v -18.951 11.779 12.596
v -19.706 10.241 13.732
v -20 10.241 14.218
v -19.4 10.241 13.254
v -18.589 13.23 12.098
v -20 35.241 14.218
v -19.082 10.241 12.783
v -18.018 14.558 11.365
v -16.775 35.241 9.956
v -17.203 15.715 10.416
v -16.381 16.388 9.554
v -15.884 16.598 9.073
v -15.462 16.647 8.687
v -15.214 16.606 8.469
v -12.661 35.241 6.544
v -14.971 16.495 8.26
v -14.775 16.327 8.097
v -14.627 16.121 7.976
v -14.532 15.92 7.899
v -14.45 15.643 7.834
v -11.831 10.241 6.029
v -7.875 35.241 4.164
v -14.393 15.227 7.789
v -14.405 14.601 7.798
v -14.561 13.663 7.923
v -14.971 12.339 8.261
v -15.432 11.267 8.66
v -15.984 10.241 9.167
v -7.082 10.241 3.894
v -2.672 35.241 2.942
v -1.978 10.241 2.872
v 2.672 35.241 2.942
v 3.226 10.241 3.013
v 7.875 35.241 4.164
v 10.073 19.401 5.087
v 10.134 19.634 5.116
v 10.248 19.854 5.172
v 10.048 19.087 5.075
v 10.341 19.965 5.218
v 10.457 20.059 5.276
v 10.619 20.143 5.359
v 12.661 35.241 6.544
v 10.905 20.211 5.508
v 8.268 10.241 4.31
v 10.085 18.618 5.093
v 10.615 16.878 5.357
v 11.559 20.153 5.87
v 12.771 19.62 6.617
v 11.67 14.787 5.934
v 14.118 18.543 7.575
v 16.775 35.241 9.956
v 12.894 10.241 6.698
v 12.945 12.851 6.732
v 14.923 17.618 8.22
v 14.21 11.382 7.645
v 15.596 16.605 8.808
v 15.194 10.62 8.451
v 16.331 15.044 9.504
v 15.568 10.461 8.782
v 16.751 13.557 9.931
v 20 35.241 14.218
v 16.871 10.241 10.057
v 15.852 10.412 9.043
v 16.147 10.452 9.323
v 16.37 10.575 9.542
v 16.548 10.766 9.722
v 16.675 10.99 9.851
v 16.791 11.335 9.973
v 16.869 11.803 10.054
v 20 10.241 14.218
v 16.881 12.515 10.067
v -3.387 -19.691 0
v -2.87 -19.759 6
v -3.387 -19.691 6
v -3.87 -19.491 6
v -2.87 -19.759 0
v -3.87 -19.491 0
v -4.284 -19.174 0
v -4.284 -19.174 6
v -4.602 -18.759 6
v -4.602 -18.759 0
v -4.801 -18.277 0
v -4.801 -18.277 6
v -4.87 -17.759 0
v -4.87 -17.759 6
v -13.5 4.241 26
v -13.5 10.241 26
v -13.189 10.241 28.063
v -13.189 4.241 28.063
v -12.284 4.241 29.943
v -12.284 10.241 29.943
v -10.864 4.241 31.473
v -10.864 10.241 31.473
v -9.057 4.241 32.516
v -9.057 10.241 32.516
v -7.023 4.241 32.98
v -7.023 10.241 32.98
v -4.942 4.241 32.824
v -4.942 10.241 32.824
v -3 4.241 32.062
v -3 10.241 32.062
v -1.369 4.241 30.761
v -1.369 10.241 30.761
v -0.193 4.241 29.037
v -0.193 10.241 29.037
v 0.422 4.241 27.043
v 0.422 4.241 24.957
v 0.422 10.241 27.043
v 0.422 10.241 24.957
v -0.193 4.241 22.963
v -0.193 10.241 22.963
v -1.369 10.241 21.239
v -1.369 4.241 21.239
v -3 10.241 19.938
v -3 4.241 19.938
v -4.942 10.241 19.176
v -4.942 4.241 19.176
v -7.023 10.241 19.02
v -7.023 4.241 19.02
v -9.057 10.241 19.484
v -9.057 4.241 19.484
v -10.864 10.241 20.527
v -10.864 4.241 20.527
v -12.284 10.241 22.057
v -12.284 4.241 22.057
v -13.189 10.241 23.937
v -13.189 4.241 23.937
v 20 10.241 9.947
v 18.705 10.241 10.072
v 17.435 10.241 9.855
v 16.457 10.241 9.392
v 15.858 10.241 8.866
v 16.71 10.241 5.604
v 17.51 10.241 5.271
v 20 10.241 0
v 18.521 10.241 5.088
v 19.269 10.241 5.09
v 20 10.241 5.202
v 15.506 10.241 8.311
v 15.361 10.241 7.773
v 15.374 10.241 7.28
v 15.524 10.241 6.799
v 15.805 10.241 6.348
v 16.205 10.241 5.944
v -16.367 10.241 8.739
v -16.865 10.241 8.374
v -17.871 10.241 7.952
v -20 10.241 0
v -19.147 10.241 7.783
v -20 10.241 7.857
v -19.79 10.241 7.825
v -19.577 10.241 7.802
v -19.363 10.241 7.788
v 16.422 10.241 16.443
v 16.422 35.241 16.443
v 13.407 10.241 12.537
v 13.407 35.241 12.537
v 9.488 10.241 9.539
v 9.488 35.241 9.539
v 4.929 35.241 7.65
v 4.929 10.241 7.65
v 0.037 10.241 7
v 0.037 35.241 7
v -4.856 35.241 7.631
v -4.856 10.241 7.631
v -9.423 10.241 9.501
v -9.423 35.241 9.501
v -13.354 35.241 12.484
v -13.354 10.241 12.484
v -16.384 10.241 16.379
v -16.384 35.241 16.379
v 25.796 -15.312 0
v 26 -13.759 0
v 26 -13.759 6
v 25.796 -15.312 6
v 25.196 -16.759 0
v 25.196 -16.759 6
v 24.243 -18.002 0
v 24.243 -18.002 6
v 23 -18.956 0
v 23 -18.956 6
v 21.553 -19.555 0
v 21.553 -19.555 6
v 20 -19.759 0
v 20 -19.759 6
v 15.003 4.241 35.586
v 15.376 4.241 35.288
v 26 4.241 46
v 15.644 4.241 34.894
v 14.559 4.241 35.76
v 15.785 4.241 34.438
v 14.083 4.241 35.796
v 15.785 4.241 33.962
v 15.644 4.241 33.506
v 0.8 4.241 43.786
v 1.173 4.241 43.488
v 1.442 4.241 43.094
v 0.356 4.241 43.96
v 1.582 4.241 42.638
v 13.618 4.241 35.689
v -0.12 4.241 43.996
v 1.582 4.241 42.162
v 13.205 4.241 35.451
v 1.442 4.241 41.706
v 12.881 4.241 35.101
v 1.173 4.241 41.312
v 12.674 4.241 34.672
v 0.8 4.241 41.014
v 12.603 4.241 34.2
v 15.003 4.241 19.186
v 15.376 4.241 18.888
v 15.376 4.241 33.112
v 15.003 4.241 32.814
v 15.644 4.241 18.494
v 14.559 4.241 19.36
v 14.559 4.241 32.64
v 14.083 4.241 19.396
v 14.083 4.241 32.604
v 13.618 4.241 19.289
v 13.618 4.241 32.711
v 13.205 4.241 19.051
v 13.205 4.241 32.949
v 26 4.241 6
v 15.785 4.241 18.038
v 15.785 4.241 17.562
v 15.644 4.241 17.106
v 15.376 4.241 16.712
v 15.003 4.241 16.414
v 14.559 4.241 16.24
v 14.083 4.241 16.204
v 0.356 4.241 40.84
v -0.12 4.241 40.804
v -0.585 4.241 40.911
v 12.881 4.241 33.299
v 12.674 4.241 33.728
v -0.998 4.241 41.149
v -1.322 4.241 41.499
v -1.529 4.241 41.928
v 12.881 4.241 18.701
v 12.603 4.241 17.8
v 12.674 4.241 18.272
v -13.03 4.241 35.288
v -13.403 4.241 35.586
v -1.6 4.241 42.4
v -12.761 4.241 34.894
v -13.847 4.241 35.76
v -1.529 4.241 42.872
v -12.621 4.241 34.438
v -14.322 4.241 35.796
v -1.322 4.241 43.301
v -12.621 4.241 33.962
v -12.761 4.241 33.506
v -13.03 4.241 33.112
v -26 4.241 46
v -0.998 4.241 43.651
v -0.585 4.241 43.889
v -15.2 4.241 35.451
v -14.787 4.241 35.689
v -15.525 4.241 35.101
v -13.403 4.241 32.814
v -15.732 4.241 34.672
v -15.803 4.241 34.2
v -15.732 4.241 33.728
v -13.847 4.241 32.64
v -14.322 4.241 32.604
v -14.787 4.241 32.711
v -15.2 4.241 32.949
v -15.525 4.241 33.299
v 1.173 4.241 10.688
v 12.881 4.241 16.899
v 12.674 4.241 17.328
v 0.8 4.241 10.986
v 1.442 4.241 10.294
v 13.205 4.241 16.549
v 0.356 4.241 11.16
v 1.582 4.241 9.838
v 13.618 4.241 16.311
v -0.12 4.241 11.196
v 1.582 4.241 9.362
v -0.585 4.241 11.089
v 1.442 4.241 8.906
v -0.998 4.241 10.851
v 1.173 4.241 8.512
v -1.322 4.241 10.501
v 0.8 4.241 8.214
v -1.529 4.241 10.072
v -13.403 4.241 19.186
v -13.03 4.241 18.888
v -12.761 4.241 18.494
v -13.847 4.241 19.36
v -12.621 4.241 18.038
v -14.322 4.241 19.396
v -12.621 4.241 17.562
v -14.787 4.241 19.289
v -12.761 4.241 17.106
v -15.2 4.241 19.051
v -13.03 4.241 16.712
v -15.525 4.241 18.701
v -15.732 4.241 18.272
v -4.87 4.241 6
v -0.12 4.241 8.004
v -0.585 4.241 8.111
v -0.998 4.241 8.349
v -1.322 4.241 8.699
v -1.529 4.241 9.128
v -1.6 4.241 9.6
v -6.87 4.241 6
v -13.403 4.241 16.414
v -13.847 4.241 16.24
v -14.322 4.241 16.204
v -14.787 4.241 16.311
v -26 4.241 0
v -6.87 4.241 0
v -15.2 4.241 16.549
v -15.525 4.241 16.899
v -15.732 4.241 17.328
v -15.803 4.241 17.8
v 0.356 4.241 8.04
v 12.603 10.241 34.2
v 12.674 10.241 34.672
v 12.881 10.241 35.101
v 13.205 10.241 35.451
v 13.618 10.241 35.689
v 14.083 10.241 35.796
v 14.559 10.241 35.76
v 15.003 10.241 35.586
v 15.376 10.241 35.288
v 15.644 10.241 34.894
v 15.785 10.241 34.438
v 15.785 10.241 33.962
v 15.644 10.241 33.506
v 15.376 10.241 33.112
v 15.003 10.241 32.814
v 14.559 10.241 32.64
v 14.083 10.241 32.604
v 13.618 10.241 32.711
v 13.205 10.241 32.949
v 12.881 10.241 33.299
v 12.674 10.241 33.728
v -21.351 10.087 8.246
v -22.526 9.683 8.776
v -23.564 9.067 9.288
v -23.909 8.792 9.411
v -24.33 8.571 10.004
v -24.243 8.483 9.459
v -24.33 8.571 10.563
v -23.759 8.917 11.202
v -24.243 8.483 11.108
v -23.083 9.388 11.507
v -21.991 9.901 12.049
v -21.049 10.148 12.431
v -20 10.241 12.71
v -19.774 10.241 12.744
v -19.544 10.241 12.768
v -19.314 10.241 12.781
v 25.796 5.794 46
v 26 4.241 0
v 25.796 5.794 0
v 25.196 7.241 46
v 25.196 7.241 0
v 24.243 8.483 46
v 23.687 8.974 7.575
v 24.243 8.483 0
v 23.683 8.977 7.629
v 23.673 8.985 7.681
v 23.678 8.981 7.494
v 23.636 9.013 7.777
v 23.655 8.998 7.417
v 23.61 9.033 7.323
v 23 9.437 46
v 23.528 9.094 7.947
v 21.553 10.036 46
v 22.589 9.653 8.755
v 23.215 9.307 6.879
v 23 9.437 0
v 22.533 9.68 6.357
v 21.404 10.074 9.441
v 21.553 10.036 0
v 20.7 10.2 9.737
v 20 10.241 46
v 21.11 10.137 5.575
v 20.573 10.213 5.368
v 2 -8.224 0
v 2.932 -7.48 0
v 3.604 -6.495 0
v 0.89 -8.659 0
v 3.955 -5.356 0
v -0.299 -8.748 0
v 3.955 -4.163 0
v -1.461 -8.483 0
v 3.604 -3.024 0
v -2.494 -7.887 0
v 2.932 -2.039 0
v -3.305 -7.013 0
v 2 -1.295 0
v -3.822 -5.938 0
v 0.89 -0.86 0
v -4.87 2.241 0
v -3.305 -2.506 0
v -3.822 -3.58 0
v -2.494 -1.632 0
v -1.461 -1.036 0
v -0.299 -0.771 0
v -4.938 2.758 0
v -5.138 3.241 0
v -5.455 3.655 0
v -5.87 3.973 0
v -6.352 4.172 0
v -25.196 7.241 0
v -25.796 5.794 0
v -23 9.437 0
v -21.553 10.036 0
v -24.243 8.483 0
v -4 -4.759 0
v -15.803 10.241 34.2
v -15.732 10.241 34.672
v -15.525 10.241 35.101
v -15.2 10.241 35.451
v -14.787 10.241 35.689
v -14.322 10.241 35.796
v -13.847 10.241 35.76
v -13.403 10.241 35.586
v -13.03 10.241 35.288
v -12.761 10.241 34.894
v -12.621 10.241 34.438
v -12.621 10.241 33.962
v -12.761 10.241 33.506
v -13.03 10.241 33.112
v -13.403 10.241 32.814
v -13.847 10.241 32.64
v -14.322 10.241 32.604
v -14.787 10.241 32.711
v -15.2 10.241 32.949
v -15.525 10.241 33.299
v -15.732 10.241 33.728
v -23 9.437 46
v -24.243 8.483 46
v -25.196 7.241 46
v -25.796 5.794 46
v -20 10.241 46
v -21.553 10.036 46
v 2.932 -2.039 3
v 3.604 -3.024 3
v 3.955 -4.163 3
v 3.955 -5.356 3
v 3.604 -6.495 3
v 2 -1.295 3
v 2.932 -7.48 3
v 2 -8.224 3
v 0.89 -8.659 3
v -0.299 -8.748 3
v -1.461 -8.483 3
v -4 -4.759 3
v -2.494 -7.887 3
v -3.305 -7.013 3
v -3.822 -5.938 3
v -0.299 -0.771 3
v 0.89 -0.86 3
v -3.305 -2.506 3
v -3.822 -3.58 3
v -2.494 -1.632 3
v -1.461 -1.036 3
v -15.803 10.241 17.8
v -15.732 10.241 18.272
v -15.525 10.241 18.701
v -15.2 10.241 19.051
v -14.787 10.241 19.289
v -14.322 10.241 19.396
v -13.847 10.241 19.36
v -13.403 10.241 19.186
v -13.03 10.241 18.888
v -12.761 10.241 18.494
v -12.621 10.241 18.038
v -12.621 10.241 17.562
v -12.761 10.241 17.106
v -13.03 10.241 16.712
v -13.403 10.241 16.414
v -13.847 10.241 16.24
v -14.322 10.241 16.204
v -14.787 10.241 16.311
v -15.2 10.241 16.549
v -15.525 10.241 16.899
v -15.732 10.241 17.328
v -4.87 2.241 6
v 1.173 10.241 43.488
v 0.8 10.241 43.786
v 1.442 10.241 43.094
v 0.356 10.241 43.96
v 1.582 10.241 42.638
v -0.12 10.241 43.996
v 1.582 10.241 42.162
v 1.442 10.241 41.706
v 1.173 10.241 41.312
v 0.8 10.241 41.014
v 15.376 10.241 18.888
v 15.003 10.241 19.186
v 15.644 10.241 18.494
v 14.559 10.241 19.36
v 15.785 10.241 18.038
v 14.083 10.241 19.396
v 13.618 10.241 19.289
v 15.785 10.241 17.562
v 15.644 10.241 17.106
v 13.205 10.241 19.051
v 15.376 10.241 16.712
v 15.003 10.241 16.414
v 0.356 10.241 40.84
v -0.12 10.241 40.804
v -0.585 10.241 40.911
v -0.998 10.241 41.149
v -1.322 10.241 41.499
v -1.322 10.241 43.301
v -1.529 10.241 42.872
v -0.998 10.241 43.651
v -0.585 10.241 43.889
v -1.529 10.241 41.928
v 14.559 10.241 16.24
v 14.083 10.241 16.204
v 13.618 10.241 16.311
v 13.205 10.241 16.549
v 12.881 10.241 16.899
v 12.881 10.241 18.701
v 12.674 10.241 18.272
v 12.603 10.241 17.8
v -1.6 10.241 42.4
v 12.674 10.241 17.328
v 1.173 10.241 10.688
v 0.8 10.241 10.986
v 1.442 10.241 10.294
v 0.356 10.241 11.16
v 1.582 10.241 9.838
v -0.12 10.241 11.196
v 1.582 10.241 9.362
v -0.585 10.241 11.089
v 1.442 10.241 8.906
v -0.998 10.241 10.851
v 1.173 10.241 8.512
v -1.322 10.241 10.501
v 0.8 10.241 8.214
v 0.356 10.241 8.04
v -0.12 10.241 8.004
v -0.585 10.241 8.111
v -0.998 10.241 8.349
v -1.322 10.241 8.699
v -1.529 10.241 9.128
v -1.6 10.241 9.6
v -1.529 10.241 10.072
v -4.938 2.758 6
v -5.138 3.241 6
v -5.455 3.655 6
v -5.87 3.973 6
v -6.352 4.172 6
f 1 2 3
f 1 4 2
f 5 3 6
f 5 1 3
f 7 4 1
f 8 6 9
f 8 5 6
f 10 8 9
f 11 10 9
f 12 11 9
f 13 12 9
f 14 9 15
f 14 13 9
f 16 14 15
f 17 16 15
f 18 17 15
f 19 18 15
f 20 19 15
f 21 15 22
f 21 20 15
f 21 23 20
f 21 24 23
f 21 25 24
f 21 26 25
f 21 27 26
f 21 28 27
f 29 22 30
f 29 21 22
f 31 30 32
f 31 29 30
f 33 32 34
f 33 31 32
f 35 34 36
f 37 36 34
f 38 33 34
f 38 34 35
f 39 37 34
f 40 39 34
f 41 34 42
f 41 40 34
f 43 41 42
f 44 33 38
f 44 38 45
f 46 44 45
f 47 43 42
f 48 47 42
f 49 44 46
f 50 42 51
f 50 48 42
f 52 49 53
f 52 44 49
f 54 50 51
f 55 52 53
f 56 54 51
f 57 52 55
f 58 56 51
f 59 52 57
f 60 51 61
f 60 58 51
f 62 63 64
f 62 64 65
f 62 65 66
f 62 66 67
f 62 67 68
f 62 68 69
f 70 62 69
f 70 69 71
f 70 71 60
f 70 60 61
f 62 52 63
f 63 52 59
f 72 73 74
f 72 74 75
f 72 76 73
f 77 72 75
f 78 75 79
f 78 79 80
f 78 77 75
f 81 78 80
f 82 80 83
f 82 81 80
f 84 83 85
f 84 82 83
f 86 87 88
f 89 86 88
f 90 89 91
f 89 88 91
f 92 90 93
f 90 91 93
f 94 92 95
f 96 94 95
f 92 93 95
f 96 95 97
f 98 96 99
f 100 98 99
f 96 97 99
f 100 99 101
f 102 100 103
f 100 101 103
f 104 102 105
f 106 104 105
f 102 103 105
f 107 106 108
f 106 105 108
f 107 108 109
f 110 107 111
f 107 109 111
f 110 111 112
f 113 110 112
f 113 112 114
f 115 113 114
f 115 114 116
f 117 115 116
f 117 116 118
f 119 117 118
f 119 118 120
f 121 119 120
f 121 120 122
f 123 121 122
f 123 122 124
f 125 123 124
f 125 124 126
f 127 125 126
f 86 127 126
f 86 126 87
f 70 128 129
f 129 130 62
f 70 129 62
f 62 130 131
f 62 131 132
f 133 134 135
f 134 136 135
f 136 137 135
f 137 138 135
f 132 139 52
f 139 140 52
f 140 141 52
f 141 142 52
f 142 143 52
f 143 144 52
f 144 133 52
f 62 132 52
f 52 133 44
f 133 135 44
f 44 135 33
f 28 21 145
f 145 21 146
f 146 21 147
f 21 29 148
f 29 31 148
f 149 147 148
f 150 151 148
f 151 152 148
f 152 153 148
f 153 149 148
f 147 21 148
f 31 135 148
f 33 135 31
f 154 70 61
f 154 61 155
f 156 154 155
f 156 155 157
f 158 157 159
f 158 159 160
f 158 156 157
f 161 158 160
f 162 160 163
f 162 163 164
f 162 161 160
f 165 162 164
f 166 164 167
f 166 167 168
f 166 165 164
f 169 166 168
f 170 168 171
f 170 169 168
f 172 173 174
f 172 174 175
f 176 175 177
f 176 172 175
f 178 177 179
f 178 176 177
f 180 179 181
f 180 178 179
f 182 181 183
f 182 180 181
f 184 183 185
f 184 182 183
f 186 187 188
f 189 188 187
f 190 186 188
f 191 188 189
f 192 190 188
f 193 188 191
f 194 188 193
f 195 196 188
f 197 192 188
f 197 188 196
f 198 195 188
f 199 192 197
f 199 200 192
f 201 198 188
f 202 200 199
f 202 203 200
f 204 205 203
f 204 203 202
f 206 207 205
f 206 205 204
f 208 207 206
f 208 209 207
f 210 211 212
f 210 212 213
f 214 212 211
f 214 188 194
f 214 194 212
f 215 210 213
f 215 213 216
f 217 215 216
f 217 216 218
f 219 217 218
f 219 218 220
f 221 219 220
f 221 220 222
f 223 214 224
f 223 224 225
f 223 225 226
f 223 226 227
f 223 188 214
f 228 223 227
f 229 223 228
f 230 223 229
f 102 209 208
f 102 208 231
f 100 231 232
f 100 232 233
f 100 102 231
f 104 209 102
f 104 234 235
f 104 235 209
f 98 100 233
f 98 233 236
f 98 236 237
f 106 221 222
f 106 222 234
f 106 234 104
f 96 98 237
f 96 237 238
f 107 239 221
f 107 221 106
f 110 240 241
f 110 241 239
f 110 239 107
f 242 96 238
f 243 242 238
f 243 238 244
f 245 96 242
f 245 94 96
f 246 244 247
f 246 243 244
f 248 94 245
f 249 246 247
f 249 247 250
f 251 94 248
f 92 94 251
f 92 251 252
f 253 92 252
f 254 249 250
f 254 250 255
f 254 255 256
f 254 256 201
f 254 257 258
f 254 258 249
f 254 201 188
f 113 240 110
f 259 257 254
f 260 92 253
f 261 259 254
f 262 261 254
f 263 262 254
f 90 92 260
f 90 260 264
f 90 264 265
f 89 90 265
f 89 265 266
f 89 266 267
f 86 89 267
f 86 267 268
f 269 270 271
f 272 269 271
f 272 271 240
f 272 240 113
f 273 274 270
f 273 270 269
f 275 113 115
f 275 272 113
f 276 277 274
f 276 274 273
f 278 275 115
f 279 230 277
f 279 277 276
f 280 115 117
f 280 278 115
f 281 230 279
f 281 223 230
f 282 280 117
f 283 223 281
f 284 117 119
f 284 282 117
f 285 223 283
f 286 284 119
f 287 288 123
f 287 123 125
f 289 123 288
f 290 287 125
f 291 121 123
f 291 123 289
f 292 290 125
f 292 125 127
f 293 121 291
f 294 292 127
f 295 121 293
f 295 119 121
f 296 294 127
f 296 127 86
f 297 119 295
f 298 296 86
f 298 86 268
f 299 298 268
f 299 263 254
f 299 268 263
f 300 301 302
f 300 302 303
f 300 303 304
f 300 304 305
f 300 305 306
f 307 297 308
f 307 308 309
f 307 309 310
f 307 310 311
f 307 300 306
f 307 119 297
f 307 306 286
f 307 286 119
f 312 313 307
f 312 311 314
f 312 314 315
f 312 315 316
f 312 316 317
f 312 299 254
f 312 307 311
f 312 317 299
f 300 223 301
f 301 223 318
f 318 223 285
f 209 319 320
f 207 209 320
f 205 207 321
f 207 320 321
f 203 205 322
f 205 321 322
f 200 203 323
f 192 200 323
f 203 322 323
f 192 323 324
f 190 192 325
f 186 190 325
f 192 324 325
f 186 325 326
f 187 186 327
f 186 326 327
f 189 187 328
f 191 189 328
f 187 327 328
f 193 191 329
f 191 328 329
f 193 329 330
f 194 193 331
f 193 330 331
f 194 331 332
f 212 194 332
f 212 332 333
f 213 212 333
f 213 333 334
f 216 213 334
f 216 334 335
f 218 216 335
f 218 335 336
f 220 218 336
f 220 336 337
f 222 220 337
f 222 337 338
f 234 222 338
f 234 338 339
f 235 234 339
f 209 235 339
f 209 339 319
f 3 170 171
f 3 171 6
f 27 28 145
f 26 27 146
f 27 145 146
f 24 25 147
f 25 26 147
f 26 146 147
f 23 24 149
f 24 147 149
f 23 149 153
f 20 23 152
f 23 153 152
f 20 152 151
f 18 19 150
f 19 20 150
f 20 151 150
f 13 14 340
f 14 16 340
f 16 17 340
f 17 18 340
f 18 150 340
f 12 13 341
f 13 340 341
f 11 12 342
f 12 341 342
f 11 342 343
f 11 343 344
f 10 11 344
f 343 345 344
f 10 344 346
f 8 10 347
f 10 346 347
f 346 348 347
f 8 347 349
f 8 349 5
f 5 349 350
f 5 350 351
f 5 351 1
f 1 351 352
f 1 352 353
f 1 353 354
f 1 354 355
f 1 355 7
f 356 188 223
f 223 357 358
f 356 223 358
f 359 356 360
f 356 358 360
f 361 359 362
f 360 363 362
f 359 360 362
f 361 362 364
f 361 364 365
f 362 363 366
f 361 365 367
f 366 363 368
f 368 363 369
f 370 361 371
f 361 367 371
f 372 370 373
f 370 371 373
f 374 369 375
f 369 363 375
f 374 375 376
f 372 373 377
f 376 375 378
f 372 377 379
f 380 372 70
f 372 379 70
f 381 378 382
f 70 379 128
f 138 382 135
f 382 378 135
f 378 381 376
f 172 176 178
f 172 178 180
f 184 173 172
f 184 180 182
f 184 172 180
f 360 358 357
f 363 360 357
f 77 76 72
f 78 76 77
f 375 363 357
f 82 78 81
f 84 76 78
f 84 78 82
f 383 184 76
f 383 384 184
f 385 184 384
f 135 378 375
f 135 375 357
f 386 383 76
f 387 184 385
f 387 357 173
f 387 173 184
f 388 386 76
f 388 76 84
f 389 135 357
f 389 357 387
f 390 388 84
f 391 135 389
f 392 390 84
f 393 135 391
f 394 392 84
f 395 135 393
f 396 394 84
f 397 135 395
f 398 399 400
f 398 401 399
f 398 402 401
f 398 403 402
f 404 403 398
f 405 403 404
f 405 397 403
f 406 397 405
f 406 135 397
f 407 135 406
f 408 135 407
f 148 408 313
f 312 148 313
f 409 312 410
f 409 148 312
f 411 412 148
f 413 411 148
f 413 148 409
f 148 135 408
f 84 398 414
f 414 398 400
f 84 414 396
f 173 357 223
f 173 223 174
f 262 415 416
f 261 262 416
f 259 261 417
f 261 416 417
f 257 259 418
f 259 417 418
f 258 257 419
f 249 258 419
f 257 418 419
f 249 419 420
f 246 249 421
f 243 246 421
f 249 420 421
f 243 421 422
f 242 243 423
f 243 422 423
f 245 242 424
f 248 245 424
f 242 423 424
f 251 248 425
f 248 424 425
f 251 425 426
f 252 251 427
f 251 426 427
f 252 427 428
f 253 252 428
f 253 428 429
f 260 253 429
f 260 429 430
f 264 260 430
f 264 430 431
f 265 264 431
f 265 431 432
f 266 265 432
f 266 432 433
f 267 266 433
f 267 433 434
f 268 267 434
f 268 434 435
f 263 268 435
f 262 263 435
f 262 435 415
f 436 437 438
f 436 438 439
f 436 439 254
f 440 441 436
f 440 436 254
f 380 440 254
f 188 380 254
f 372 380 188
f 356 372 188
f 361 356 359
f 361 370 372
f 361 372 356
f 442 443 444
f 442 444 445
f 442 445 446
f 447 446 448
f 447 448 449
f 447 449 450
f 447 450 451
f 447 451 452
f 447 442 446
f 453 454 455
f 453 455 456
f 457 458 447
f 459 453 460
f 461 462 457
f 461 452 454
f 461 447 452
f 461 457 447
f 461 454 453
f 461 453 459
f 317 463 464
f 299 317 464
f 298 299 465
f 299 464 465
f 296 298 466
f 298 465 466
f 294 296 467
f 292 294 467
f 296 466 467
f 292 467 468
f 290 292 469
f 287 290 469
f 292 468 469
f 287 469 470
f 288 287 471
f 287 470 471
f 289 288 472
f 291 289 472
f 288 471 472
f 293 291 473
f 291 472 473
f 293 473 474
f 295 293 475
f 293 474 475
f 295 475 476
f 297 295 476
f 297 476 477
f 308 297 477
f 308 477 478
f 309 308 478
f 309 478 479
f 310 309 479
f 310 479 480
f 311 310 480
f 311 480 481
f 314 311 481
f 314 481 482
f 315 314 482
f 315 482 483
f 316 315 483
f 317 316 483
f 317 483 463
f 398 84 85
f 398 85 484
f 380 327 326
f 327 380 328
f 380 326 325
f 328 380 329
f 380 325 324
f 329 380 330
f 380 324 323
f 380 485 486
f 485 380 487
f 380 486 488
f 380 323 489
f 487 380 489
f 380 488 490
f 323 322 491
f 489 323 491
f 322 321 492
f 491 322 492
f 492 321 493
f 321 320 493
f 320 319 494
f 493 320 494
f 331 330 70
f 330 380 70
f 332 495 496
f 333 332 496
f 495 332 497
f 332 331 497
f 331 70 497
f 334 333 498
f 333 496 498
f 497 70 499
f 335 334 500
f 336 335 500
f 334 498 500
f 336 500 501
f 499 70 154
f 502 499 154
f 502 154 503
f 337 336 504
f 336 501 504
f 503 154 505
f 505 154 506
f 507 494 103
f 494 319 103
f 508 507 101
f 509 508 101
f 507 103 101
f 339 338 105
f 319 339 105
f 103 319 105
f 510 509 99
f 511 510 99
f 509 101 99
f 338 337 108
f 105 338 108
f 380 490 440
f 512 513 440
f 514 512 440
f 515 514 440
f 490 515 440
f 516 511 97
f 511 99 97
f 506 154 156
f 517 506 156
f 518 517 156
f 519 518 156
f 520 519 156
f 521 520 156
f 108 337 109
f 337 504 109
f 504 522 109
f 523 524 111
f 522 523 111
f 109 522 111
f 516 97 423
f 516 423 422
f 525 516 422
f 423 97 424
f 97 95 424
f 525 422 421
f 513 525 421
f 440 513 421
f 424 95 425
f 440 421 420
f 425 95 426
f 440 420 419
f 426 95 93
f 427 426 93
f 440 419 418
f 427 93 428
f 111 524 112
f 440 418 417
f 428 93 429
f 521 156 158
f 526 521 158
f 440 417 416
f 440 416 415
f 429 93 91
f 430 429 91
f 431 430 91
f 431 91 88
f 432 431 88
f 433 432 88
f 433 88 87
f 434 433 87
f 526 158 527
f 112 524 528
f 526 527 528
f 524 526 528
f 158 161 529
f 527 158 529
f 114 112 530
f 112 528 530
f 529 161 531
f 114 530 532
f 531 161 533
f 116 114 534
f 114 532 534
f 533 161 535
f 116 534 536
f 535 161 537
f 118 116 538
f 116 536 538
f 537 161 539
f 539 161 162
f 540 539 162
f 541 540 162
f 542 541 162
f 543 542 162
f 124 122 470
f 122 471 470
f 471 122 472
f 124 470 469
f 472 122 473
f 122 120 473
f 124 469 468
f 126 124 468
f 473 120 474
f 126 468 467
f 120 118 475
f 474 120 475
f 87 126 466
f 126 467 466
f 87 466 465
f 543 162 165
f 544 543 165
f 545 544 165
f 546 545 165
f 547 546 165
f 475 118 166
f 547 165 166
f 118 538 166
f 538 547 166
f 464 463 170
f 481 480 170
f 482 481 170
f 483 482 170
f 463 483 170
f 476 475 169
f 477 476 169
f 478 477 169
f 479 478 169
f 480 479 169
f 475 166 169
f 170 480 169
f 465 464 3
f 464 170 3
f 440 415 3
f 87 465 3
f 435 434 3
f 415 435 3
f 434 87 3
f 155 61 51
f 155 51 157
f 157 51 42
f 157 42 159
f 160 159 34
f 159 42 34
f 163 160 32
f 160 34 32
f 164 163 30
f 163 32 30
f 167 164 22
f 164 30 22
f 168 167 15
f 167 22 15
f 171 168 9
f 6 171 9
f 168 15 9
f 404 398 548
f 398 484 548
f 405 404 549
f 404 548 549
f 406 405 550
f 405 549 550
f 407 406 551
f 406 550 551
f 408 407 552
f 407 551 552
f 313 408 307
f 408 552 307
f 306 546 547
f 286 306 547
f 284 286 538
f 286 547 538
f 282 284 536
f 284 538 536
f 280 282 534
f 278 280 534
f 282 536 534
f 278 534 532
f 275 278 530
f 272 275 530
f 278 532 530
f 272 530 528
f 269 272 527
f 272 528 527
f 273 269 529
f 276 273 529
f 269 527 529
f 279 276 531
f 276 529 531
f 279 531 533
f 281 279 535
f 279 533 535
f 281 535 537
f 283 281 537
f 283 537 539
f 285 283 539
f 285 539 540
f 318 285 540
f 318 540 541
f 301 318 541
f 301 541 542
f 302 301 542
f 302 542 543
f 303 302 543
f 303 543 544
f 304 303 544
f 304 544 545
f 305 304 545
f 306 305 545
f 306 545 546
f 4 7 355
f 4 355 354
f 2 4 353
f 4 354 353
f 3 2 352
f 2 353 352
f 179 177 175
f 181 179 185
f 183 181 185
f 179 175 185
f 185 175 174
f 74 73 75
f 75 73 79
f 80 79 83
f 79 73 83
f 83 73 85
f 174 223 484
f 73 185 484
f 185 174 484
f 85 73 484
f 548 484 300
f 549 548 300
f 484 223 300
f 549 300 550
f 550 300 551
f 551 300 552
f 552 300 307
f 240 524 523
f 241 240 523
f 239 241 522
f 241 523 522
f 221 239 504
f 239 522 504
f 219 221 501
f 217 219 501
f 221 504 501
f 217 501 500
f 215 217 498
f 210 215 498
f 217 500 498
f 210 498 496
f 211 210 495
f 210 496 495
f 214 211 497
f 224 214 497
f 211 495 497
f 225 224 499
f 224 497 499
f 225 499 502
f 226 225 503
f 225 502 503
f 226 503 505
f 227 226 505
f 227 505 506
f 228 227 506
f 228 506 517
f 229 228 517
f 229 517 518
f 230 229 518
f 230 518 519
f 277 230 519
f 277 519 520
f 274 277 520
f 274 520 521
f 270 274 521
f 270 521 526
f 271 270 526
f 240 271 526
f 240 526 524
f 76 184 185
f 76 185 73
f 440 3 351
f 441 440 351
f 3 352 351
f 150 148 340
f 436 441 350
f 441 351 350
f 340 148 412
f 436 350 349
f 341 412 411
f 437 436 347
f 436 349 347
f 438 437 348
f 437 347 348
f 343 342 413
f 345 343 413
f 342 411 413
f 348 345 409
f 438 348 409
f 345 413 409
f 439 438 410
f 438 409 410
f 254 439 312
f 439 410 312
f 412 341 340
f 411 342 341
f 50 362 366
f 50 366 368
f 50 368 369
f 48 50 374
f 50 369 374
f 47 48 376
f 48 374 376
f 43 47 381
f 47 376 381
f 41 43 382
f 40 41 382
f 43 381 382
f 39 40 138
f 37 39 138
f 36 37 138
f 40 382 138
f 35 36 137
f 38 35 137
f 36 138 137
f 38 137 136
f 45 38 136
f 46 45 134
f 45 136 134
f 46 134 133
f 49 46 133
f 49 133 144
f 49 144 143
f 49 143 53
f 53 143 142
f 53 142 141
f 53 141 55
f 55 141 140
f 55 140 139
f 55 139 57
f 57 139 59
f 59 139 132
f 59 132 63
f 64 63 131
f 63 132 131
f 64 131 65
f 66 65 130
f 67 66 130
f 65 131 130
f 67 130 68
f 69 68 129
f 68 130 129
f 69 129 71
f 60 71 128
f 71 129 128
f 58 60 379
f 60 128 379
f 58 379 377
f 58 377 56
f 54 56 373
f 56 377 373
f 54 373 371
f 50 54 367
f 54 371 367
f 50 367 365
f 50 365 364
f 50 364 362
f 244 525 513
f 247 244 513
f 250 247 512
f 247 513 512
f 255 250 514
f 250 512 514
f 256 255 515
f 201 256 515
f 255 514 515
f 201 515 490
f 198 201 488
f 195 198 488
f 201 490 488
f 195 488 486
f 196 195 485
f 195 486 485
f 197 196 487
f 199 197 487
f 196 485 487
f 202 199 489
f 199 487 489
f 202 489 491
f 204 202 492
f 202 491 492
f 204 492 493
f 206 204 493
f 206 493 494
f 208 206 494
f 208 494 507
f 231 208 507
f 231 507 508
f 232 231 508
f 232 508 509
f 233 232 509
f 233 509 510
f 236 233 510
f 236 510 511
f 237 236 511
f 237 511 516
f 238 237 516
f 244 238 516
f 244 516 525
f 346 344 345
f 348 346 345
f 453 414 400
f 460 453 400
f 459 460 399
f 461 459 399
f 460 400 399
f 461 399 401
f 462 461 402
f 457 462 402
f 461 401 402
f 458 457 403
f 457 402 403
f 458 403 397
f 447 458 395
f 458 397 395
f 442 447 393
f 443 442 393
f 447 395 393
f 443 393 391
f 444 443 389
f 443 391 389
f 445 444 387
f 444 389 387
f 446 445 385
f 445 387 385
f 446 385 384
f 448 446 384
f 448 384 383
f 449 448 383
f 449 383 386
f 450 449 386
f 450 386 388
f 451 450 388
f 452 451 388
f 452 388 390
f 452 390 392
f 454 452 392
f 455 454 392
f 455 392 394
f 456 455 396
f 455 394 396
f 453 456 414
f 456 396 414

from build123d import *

# Parameters (mm, degrees)
BOSS_EXTRUDE1_DEPTH      = 6
BOSS_EXTRUDE2_DEPTH      = 40
CUT_EXTRUDE1_REACH       = 62.762
SKETCH9_R                = 1.6
CUT_EXTRUDE2_REACH       = 62.762
SKETCH10_R               = 7
BOSS_EXTRUDE4_DEPTH      = 25
BOSS_EXTRUDE5_REACH      = 73.576
SKETCH12_R               = 2.5
BOSS_EXTRUDE6_REACH      = 73.576
BOSS_EXTRUDE6_END_RADIUS = 23.21251372
SKETCH14_R               = 2.5
SKETCH17_W               = 26.966711831
SKETCH17_H               = 26.757667553
CUT_EXTRUDE4_DEPTH       = 6
FILLET1_R                = 2
SKETCH7_R                = 4
CUT_EXTRUDE5_DEPTH       = 3


with BuildPart() as part:
    # Sketch3 → Boss-Extrude1 (new body)
    with BuildSketch(Plane.XY):
        with BuildLine():
            Line((-20, 10.240601504), (20, 10.240601504))
            ThreePointArc((20, 10.240601504), (24.242640687, 8.483242191), (26, 4.240601504))
            Line((26, 4.240601504), (26, -13.759398496))
            ThreePointArc((26, -13.759398496), (24.242640687, -18.002039183), (20, -19.759398496))
            Line((20, -19.759398496), (-20, -19.759398496))
            ThreePointArc((-20, -19.759398496), (-24.242640687, -18.002039183), (-26, -13.759398496))
            Line((-26, -13.759398496), (-26, 4.240601504))
            ThreePointArc((-26, 4.240601504), (-24.242640687, 8.483242191), (-20, 10.240601504))
        make_face()
    extrude(amount=BOSS_EXTRUDE1_DEPTH)

    # Sketch4 → Boss-Extrude2 (add)
    with BuildSketch(Plane.XY.offset(6)):
        with BuildLine():
            Line((-26, 4.240601504), (26, 4.240601504))
            ThreePointArc((26, 4.240601504), (24.242640687, 8.483242191), (20, 10.240601504))
            Line((20, 10.240601504), (-20, 10.240601504))
            ThreePointArc((-20, 10.240601504), (-24.242640687, 8.483242191), (-26, 4.240601504))
        make_face()
    extrude(amount=BOSS_EXTRUDE2_DEPTH)

    # Sketch9 → Cut-Extrude1 (cut, up to next)
    with BuildSketch(Plane(origin=(0, 10.240601504, 0), x_dir=(1, 0, 0), z_dir=(0, 1, 0)), mode=Mode.PRIVATE) as cut_extrude1_sk1:
        with Locations(Location((0, -42.4, 0), (0, 0, 180))):
            Circle(SKETCH9_R)
    cut_extrude1_tool1 = extrude(cut_extrude1_sk1.sketch, amount=-CUT_EXTRUDE1_REACH, mode=Mode.PRIVATE) & part.part
    # Sketch9 → Cut-Extrude1 (cut, up to next)
    with BuildSketch(Plane(origin=(0, 10.240601504, 0), x_dir=(1, 0, 0), z_dir=(0, 1, 0)), mode=Mode.PRIVATE) as cut_extrude1_sk2:
        with Locations(Location((14.202816622, -34.2, 0), (0, 0, 180))):
            Circle(SKETCH9_R)
    cut_extrude1_tool2 = extrude(cut_extrude1_sk2.sketch, amount=-CUT_EXTRUDE1_REACH, mode=Mode.PRIVATE) & part.part
    # Sketch9 → Cut-Extrude1 (cut, up to next)
    with BuildSketch(Plane(origin=(0, 10.240601504, 0), x_dir=(1, 0, 0), z_dir=(0, 1, 0)), mode=Mode.PRIVATE) as cut_extrude1_sk3:
        with Locations(Location((-14.202816622, -34.2, 0), (0, 0, 180))):
            Circle(SKETCH9_R)
    cut_extrude1_tool3 = extrude(cut_extrude1_sk3.sketch, amount=-CUT_EXTRUDE1_REACH, mode=Mode.PRIVATE) & part.part
    # Sketch9 → Cut-Extrude1 (cut, up to next)
    with BuildSketch(Plane(origin=(0, 10.240601504, 0), x_dir=(1, 0, 0), z_dir=(0, 1, 0)), mode=Mode.PRIVATE) as cut_extrude1_sk4:
        with Locations(Location((-14.202816622, -17.8, 0), (0, 0, 180))):
            Circle(SKETCH9_R)
    cut_extrude1_tool4 = extrude(cut_extrude1_sk4.sketch, amount=-CUT_EXTRUDE1_REACH, mode=Mode.PRIVATE) & part.part
    # Sketch9 → Cut-Extrude1 (cut, up to next)
    with BuildSketch(Plane(origin=(0, 10.240601504, 0), x_dir=(1, 0, 0), z_dir=(0, 1, 0)), mode=Mode.PRIVATE) as cut_extrude1_sk5:
        with Locations(Location((0, -9.6, 0), (0, 0, 180))):
            Circle(SKETCH9_R)
    cut_extrude1_tool5 = extrude(cut_extrude1_sk5.sketch, amount=-CUT_EXTRUDE1_REACH, mode=Mode.PRIVATE) & part.part
    # Sketch9 → Cut-Extrude1 (cut, up to next)
    with BuildSketch(Plane(origin=(0, 10.240601504, 0), x_dir=(1, 0, 0), z_dir=(0, 1, 0)), mode=Mode.PRIVATE) as cut_extrude1_sk6:
        with Locations(Location((14.202816622, -17.8, 0), (0, 0, 180))):
            Circle(SKETCH9_R)
    cut_extrude1_tool6 = extrude(cut_extrude1_sk6.sketch, amount=-CUT_EXTRUDE1_REACH, mode=Mode.PRIVATE) & part.part
    add(cut_extrude1_tool1.solids().sort_by_distance((0, 10.240602, 42.4))[0], mode=Mode.SUBTRACT)
    add(cut_extrude1_tool2.solids().sort_by_distance((14.202817, 10.240602, 34.2))[0], mode=Mode.SUBTRACT)
    add(cut_extrude1_tool3.solids().sort_by_distance((-14.202817, 10.240602, 34.2))[0], mode=Mode.SUBTRACT)
    add(cut_extrude1_tool4.solids().sort_by_distance((-14.202817, 10.240602, 17.8))[0], mode=Mode.SUBTRACT)
    add(cut_extrude1_tool5.solids().sort_by_distance((0, 10.240602, 9.6))[0], mode=Mode.SUBTRACT)
    add(cut_extrude1_tool6.solids().sort_by_distance((14.202817, 10.240602, 17.8))[0], mode=Mode.SUBTRACT)

    # Sketch10 → Cut-Extrude2 (cut, up to next)
    with BuildSketch(Plane(origin=(0, 10.240601504, 0), x_dir=(1, 0, 0), z_dir=(0, 1, 0)), mode=Mode.PRIVATE) as cut_extrude2_sk1:
        with Locations(Location((-6.5, -26, 0), (0, 0, 180))):
            Circle(SKETCH10_R)
    cut_extrude2_tool1 = extrude(cut_extrude2_sk1.sketch, amount=-CUT_EXTRUDE2_REACH, mode=Mode.PRIVATE) & part.part
    add(cut_extrude2_tool1.solids().sort_by_distance((-6.5, 10.240602, 26))[0], mode=Mode.SUBTRACT)

    # Sketch11 → Boss-Extrude4 (add)
    with BuildSketch(Plane(origin=(0, 10.240601504, 0), x_dir=(1, 0, 0), z_dir=(0, 1, 0))):
        with BuildLine():
            Line((20, -14.217776389), (16.421656056, -16.443368147))
            ThreePointArc((16.421656056, -16.443368147), (0.037479345, -7.000036966), (-16.383825563, -16.378656023))
            Line((-16.383825563, -16.378656023), (-20, -14.217776389))
            ThreePointArc((-20, -14.217776389), (0, -2.78748628), (20, -14.217776389))
        make_face()
    extrude(amount=BOSS_EXTRUDE4_DEPTH)

    # Sketch12 → Boss-Extrude5 (add, up to next)
    with BuildSketch(Plane(origin=(7.879699248, -7.879699248, 0), x_dir=(0, 0, 1), z_dir=(-0.7071067811865489, 0.7071067811865462, 0)), mode=Mode.PRIVATE) as boss_extrude5_sk1:
        with Locations(Location((7.574761701, 20.594839086, 0), (0, 0, 90))):
            Circle(SKETCH12_R)
    boss_extrude5_tool1 = extrude(boss_extrude5_sk1.sketch, amount=BOSS_EXTRUDE5_REACH, mode=Mode.PRIVATE) - part.part
    add(boss_extrude5_tool1.solids().sort_by_distance((22.44245, 6.683051, 7.574762))[0])

    # Boss-Extrude6: up to this cylinder (the profile starts outside it)
    boss_extrude6_end = Plane(origin=(0, 6.81435, 26), z_dir=(0, -1, 0)) * Cylinder(BOSS_EXTRUDE6_END_RADIUS, 194.57702744, mode=Mode.PRIVATE)
    # Sketch14 → Boss-Extrude6 (add, up to the surface)
    with BuildSketch(Plane(origin=(-7.879699248, -7.879699248, 0), x_dir=(0, 0, -1), z_dir=(0.7071067811865487, 0.7071067811865465, 0)), mode=Mode.PRIVATE) as boss_extrude6_sk1:
        with Locations((-10.283332747, 20.780524406)):
            Circle(SKETCH14_R)
    boss_extrude6_tool1 = extrude(boss_extrude6_sk1.sketch, amount=BOSS_EXTRUDE6_REACH, mode=Mode.PRIVATE) - boss_extrude6_end
    add(boss_extrude6_tool1.solids().sort_by_distance((-22.573749, 6.81435, 10.283333))[0])

    # Sketch17 → Cut-Extrude4 (cut)
    with BuildSketch(Plane(origin=(0, 0, 0), x_dir=(-1, 0, 0), z_dir=(0, 0, -1))):
        with Locations((18.352928334, -9.138232272)):
            Rectangle(SKETCH17_W, SKETCH17_H)
    extrude(amount=-CUT_EXTRUDE4_DEPTH, mode=Mode.SUBTRACT)

    # Fillet1
    fillet1_edges = [part.edges().sort_by_distance(p)[0] for p in [
        (-4.869572418, -19.759398496, 3),
        (-4.869572418, 4.240601504, 3),
    ]]
    fillet(fillet1_edges, radius=FILLET1_R)

    # Sketch7 → Cut-Extrude5 (cut)
    with BuildSketch(Plane(origin=(0, 0, 0), x_dir=(-1, 0, 0), z_dir=(0, 0, -1))):
        with Locations((0, -4.759398496)):
            Circle(SKETCH7_R)
    extrude(amount=-CUT_EXTRUDE5_DEPTH, mode=Mode.SUBTRACT)


solid = part.part
